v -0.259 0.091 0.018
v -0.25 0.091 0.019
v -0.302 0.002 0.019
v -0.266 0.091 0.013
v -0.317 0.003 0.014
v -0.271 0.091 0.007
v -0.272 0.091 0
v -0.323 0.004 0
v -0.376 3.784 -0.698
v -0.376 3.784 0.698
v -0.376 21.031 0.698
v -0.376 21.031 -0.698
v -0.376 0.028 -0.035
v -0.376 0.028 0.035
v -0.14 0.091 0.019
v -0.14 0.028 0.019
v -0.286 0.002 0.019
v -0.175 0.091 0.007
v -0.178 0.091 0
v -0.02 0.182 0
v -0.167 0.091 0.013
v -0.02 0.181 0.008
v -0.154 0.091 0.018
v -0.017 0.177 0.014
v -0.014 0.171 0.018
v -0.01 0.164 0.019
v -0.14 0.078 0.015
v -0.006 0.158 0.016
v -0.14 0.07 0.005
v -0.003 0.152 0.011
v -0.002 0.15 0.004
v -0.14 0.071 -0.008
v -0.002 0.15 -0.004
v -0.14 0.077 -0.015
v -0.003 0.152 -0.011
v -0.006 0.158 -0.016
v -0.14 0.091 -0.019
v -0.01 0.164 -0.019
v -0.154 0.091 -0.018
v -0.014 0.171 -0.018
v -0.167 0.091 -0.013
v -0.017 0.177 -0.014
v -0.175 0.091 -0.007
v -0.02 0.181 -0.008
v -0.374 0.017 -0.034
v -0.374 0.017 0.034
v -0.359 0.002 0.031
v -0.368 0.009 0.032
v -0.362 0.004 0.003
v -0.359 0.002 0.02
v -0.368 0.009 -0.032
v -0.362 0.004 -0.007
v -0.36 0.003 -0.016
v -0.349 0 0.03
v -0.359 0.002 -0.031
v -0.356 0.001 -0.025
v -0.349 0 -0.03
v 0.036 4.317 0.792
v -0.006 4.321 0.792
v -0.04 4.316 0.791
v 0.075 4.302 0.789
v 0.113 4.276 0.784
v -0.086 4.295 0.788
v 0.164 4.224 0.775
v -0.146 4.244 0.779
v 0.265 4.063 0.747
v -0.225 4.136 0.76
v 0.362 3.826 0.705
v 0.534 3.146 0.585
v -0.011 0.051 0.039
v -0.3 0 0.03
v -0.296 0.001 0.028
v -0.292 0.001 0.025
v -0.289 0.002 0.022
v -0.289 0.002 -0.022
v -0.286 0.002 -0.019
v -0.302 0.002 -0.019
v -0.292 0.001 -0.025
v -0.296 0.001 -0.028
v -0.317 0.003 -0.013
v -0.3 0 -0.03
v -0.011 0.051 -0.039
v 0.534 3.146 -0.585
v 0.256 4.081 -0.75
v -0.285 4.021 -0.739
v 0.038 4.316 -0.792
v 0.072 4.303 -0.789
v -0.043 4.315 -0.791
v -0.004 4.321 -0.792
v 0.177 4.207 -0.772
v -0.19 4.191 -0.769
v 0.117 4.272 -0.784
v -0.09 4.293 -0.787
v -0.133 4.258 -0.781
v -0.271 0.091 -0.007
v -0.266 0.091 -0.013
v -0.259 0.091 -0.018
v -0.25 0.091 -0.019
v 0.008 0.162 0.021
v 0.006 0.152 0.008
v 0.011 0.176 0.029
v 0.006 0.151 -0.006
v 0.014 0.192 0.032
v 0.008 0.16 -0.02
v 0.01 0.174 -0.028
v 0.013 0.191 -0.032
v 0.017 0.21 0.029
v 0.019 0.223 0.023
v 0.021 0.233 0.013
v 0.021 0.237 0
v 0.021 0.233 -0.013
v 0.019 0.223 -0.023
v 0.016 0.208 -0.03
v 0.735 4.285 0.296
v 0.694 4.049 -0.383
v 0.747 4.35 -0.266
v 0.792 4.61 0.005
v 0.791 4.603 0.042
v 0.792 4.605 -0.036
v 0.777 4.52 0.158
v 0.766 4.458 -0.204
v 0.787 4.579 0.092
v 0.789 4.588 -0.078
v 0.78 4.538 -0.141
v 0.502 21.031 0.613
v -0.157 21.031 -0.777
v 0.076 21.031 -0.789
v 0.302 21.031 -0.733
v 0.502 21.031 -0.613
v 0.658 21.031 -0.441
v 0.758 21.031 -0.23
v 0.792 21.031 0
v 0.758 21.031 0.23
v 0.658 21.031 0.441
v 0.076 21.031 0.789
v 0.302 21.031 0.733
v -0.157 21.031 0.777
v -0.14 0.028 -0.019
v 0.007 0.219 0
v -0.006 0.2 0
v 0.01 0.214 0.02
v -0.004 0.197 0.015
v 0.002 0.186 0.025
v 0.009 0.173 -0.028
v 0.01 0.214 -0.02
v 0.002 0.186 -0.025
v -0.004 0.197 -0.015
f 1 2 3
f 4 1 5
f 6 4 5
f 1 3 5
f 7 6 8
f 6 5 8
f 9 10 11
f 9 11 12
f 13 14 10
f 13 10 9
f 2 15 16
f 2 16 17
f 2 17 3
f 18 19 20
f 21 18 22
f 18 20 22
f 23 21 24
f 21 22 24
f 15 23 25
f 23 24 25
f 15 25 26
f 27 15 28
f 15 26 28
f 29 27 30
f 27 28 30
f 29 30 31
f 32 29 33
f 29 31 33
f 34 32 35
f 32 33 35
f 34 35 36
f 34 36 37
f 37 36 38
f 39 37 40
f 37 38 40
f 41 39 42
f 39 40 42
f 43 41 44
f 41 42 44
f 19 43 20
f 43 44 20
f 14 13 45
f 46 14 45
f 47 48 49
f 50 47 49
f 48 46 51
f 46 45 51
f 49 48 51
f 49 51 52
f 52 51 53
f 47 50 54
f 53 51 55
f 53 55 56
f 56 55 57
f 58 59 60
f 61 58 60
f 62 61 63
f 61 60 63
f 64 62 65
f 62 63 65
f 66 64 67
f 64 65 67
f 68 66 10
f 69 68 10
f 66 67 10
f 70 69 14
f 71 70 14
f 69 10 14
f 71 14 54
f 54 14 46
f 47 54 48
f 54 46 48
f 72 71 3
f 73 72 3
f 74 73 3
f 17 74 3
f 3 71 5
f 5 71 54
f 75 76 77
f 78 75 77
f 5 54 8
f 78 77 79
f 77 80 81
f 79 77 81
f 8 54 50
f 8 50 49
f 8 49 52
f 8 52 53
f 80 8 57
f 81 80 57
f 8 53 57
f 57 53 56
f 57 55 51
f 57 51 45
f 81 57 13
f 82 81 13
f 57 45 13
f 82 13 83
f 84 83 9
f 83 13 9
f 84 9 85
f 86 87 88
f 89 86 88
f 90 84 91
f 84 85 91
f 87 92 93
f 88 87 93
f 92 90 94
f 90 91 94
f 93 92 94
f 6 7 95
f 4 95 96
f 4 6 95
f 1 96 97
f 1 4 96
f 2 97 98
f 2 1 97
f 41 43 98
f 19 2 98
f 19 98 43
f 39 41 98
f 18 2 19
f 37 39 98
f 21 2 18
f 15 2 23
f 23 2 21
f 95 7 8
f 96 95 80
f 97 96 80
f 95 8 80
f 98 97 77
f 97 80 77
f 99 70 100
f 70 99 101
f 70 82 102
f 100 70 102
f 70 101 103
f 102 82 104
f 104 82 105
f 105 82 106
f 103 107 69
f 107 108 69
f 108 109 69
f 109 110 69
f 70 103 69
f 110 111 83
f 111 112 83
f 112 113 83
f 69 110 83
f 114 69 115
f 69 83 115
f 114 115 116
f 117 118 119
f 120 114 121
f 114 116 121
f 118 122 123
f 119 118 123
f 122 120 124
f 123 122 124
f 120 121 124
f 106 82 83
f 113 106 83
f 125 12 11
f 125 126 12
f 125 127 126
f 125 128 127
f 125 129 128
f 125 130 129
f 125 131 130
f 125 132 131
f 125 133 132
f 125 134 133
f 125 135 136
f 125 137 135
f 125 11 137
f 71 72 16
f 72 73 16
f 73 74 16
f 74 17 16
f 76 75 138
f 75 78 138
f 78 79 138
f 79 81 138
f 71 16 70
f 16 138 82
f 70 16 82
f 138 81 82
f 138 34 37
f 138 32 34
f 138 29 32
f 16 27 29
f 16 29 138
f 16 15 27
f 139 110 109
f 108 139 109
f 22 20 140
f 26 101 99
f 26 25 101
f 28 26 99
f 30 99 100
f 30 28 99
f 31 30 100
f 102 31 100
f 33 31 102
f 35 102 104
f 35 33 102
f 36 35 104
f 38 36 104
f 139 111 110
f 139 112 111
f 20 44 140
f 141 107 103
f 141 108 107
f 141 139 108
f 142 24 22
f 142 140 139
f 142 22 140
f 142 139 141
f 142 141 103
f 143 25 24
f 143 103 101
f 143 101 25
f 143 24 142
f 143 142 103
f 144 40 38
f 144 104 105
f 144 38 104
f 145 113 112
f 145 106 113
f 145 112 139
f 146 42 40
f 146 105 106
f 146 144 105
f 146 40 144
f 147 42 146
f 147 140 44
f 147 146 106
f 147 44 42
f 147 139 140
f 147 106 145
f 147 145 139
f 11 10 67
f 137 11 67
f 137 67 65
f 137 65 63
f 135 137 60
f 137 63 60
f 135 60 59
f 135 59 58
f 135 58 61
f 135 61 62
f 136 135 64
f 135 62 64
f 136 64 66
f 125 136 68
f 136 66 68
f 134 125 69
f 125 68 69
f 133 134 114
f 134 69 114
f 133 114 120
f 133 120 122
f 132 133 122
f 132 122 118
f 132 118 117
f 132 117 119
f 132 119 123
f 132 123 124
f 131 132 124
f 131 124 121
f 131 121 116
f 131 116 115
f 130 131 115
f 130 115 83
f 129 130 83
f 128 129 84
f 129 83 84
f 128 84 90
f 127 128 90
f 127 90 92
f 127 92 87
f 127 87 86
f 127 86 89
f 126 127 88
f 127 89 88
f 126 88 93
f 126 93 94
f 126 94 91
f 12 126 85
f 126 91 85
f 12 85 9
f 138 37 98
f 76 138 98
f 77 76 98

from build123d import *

# Parameters (mm, degrees)
TD_SKETCH_R                             = 0.79248
TL_FEATURE_DEPTH                        = 21.0312
TDF_STD_SKETCH_W                        = 2.09296
TDF_STD_SKETCH_H                        = 2.09296
TDF_STD_FEATURE_DEPTH                   = 22.061040395
ISA_20_STD_FEATURE_DEPTH                = 22.061040395
ISA_20_STD_FEATURE_DEPTH_BACK           = 22.061040395
F_10BA_STD_FEATURE_DEPTH                = 22.061040395
F_10BA_STD_FEATURE_DEPTH_BACK           = 22.061040395
FRO_STD_FEATURE_DEPTH                   = 22.061040395
FRO_STD_FEATURE_DEPTH_BACK              = 22.061040395
C_STD_FEATURE_DEPTH                     = 22.061040395
C_STD_FEATURE_DEPTH_BACK                = 22.061040395
ERW_STD_FEATURE_DEPTH                   = 0.01905
H_STD_FEATURE_REACH                     = 22.896
H_STD_SKETCH_R                          = 0.01905
H_STD_SKETCH_3_R                        = 0.01905
FUNNEL_FINAL_DIAMETRE_STD_FEATURE_DEPTH = 2.499995
FUNNEL_FINAL_DIAMETRE_STD_FEATURE_DRAFT = -22.5
ROUND_BR_STD_FEATURE_START              = -1
ROUND_BR_STD_FEATURE_DEPTH              = 1.009339363


with BuildPart() as part:
    # TD_sketch → TL_feature (new body)
    with BuildSketch(Plane(origin=(0, 0, 0), x_dir=(1, 0, 0), z_dir=(0, 1, 0))):
        with Locations(Location((0, 0, 0), (0, 0, 270))):
            Circle(TD_SKETCH_R)
    extrude(amount=TL_FEATURE_DEPTH)

    # TDF_STD_sketch → TDF_STD_feature (cut, through all)
    with BuildSketch(Plane(origin=(0, 0, 0), x_dir=(1, 0, 0), z_dir=(0, 1, 0))):
        with Locations((-1.4224, 0)):
            Rectangle(TDF_STD_SKETCH_W, TDF_STD_SKETCH_H)
    extrude(amount=TDF_STD_FEATURE_DEPTH, mode=Mode.SUBTRACT)

    # ISA_20_STD_sketch → ISA_20_STD_feature (cut, two sides: drawn at the far end of the back side and taken through both)
    with BuildSketch(Plane(origin=(0, 0, 0), x_dir=(0, 0, -1), z_dir=(1, 0, 0)).offset(-ISA_20_STD_FEATURE_DEPTH_BACK)):
        Polygon((-12.946999885, 73.253224398), (-3.738847997, 21.0312), (-0.03048, 0), (0.03048, 0), (3.738847997, 21.0312), (12.946999885, 73.253224398), (12.946999885, -32.802042202), (-12.946999885, -32.802042202), align=None)
    extrude(amount=ISA_20_STD_FEATURE_DEPTH + ISA_20_STD_FEATURE_DEPTH_BACK, mode=Mode.SUBTRACT)

    # 10BA_STD_sketch → 10BA_STD_feature (cut, two sides: drawn at the far end of the back side and taken through both)
    with BuildSketch(Plane.XY.offset(-F_10BA_STD_FEATURE_DEPTH_BACK)):
        Polygon((-53.216424634, 0), (-0.37592, 0), (-0.29972, 0), (-0.011354365, 0.050846642), (3.688047997, 21.0312), (12.863705333, 73.068938636), (91.245889802, 2.18375769), (25.165759835, -70.885180946), align=None)
    extrude(amount=F_10BA_STD_FEATURE_DEPTH + F_10BA_STD_FEATURE_DEPTH_BACK, mode=Mode.SUBTRACT)

    # FRO_STD_sketch → FRO_STD_feature (cut, two sides: drawn at the far end of the back side and taken through both)
    with BuildSketch(Plane.XY.offset(-FRO_STD_FEATURE_DEPTH_BACK)):
        with BuildLine():
            Line((-0.37592, 52.152138388), (-0.37592, 0.02794))
            ThreePointArc((-0.37592, 0.02794), (-0.367736563, 0.008183437), (-0.34798, 0))
            Line((-0.34798, 0), (51.776218388, 0))
            Line((51.776218388, 0), (-21.9385299, -73.714748288))
            Line((-21.9385299, -73.714748288), (-74.090668288, -21.5626099))
            Line((-74.090668288, -21.5626099), (-0.37592, 52.152138388))
        make_face()
    extrude(amount=FRO_STD_FEATURE_DEPTH + FRO_STD_FEATURE_DEPTH_BACK, mode=Mode.SUBTRACT)

    # C_STD_sketch → C_STD_feature (cut, two sides: drawn at the far end of the back side and taken through both)
    with BuildSketch(Plane(origin=(0, 0, 0), x_dir=(0, 0, -1), z_dir=(1, 0, 0)).offset(-C_STD_FEATURE_DEPTH_BACK)):
        with BuildLine():
            Line((-50.530423385, -12.791040855), (-0.030559272, 0))
            ThreePointArc((-0.030559272, 0), (0, 0.00381), (0.030559272, 0))
            Line((0.030559272, 0), (50.530423385, -12.791040855))
            Line((50.530423385, -12.791040855), (50.530423385, -116.980234183))
            Line((50.530423385, -116.980234183), (-50.530423385, -116.980234183))
            Line((-50.530423385, -116.980234183), (-50.530423385, -12.791040855))
        make_face()
    extrude(amount=C_STD_FEATURE_DEPTH + C_STD_FEATURE_DEPTH_BACK, mode=Mode.SUBTRACT)


with BuildPart() as body_2:
    # ERW_STD_sketch → ERW_STD_feature (new, symmetric)
    with BuildSketch(Plane.XY):
        Polygon((-0.1397, 0.09144), (-0.1397, 0), (-0.32512, 0), (-0.272327091, 0.09144), align=None)
    extrude(amount=ERW_STD_FEATURE_DEPTH, both=True)

    # H_STD_sketch → H_STD_feature (add, up to next)
    with BuildSketch(Plane(origin=(-0.010897713, 0.165804035, 0), x_dir=(0, 0, -1), z_dir=(0.8660254037844415, 0.4999999999999953, 0)), mode=Mode.PRIVATE) as h_std_feature_sk1:
        with Locations(Location((0, 0, 0), (0, 0, 90))):
            Circle(H_STD_SKETCH_R)
    h_std_feature_tool1 = extrude(h_std_feature_sk1.sketch, amount=-H_STD_FEATURE_REACH, mode=Mode.PRIVATE) - body_2.part
    add(h_std_feature_tool1.solids().sort_by_distance((-0.010898, 0.165804, 0))[0])


with BuildPart() as funnel_final_diametre_std_feature_tool:
    # H_STD_sketch<3> → funnel_final_diametre_STD_feature (with draft: the straight prism first)
    with BuildSketch(Plane(origin=(-0.010897713, 0.165804035, 0), x_dir=(0, 0, -1), z_dir=(0.8660254037844415, 0.4999999999999953, 0))):
        with Locations(Location((0, 0, 0), (0, 0, 90))):
            Circle(H_STD_SKETCH_3_R)
    extrude(amount=FUNNEL_FINAL_DIAMETRE_STD_FEATURE_DEPTH)
    # funnel_final_diametre_STD_feature: the draft: its side faces are tilted about the plane it starts from
    funnel_final_diametre_std_feature_sides = [funnel_final_diametre_std_feature_tool.faces().sort_by_distance(p)[0] for p in [
        (1.081156877, 0.774305001, 0),
    ]]
    draft(funnel_final_diametre_std_feature_sides, Plane(origin=(-0.010897713, 0.165804035, 0), x_dir=(0, 0, -1), z_dir=(0.8660254037844415, 0.4999999999999953, 0)), FUNNEL_FINAL_DIAMETRE_STD_FEATURE_DRAFT)


with BuildPart() as body_2_1:
    add(body_2.part)

    # funnel_final_diametre_STD_feature: add funnel_final_diametre_std_feature_tool
    add(funnel_final_diametre_std_feature_tool.part)

    # ROUND_BR_STD_feature: read off the stored shape, not the designer's step
    # ROUND_BR_STD_feature outline → ROUND_BR_STD_feature (cut)
    with BuildSketch(Plane(origin=(0, 0, 0), x_dir=(0.8660254037844362, -0.5000000000000042, 0), z_dir=(0.5000000000000042, 0.8660254037844363, 0)).offset(ROUND_BR_STD_FEATURE_START)):
        with BuildLine():
            Line((-0.281562179, -0.01905), (-0.262512179, -0.01905))
            ThreePointArc((-0.262512179, -0.01905), (-0.275982563, -0.013470384), (-0.281562179, 0))
            Line((-0.281562179, 0), (-0.281562179, -0.01905))
        make_face()
        with BuildLine():
            Line((-0.281562179, 0.01905), (-0.281562179, 0))
            ThreePointArc((-0.281562179, 0), (-0.275982563, 0.013470384), (-0.262512179, 0.01905))
            Line((-0.262512179, 0.01905), (-0.281562179, 0.01905))
        make_face()
    extrude(amount=ROUND_BR_STD_FEATURE_DEPTH, mode=Mode.SUBTRACT)


with BuildPart() as part_1:
    add(part.part)

    # COMBINE_STD_feature: cut body 2
    add(body_2_1.part, mode=Mode.SUBTRACT)


solid = part_1.part
